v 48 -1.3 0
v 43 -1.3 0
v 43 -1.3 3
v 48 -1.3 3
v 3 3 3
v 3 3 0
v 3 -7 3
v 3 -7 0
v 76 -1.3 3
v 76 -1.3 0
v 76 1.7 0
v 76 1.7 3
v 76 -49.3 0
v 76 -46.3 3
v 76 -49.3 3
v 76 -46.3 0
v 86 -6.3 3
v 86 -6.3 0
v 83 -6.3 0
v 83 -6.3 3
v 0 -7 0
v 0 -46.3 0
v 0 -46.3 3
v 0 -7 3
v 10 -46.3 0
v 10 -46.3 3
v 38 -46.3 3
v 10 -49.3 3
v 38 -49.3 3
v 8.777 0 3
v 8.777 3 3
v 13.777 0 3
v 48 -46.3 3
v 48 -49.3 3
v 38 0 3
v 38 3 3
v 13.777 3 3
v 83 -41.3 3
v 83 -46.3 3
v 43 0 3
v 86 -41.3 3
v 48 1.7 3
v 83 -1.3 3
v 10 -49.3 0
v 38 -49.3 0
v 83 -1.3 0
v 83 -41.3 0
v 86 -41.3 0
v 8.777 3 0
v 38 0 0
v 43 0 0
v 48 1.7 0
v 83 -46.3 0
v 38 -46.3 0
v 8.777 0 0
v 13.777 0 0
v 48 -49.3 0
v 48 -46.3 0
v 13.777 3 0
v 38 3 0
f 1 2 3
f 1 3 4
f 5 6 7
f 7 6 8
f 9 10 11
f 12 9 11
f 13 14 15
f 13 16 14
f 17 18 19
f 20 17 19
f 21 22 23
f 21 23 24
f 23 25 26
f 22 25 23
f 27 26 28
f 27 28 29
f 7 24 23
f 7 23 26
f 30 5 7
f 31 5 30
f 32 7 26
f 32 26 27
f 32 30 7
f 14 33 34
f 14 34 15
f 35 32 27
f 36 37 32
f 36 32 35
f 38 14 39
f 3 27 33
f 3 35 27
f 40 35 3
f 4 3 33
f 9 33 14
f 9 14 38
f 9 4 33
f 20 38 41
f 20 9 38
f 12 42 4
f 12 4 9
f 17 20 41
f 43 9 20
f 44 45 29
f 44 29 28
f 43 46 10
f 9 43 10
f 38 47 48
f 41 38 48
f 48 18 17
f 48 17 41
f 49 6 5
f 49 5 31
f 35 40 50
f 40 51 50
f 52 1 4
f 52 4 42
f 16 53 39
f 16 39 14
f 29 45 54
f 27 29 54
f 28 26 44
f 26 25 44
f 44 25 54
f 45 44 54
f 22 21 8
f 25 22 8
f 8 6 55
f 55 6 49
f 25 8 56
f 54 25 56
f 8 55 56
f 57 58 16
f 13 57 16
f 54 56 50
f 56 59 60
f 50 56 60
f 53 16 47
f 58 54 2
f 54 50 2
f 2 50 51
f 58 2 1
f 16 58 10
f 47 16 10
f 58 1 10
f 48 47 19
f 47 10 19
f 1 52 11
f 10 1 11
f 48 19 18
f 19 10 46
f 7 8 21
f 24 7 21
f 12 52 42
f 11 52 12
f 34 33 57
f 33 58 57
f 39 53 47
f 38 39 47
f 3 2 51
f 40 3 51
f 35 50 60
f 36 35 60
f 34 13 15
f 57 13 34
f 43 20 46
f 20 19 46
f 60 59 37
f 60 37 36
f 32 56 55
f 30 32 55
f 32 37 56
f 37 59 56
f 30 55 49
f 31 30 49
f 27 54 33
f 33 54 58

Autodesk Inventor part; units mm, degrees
ref_plane "YZ Plane" through (0, 0, 0) normal (1, 0, 0) x (0, 1, 0)
ref_plane "XZ Plane" through (0, 0, 0) normal (0, 1, 0) x (-1, 0, 0)
ref_plane "XY Plane" through (0, 0, 0) normal (0, 0, 1) x (1, 0, 0)
sketch "Sketch1" plane through (0, 0, 0) normal (0, 0, 1) x (1, 0, 0)
  line L0 (0, -46.3) -> (0, 3) projected
  line L1 (3, 3) -> (43, 3) projected
  line L2 (3, 3) -> (0, 3) projected
  line L3 (43, 0) -> (43, 3) projected
  line L4 (43, 1.7) -> (86, 1.7) projected
  line L5 (86, -1.3) -> (86, 1.7) projected
  line L6 (86, -1.3) -> (86, -46.3) projected
  line L7 (86, -46.3) -> (86, -49.3) projected
  line L8 (86, -49.3) -> (0, -49.3) projected
  line L9 (0, -46.3) -> (0, -49.3) projected
  line L10 (3, -46.3) -> (0, -46.3) projected
  line L11 (3, 3) -> (3, 0) projected
  line L12 (43, -1.3) -> (43, 1.7) projected
  line L13 (83, -46.3) -> (83, -1.3) projected
  line L14 (83, -46.3) -> (86, -46.3) projected
  line L15 (86, -1.3) -> (86, -46.3) projected
  line L16 (83, -1.3) -> (86, -1.3) projected
  line L17 (83, -46.3) -> (76, -46.3)
  line L18 (76, -46.3) -> (76, -49.3)
  line L19 (83, -1.3) -> (76, -1.3)
  line L20 (76, -1.3) -> (76, 1.7)
  line L21 (43, -1.3) -> (48, -1.3)
  line L22 (48, -1.3) -> (48, 1.7)
  line L23 (43, 0) -> (38, 0)
  line L24 (38, 0) -> (38, 3)
  line L25 (3, -46.3) -> (10, -46.3)
  line L26 (10, -46.3) -> (10, -49.3)
  line L27 (3, 0) -> (3, -7)
  line L28 (3, -7) -> (0, -7)
  line L29 (13.777, 0) -> (8.777, 0)
  line L30 (8.777, 0) -> (8.777, 3)
  line L31 (8.777, 3) -> (13.777, 3)
  line L32 (13.777, 3) -> (13.777, 0)
  line L33 (48, -49.3) -> (38, -49.3)
  line L34 (38, -49.3) -> (38, -46.3)
  line L35 (38, -46.3) -> (48, -46.3)
  line L36 (48, -46.3) -> (48, -49.3)
  line L37 (86, -6.3) -> (83, -6.3)
  line L38 (83, -41.3) -> (86, -41.3)
  point P0 (0, 0)
  point P1 (43, -49.3)
  dimension "d0" = 10
  dimension "d1" = 10
  dimension "d2" = 10
  dimension "d3" = 10
  dimension "d4" = 10
  dimension "d5" = 5
  dimension "d6" = 5
  dimension "d7" = 5
  dimension "d10" = 5
  dimension "d11" = 5
extrude "Extrusion1" add sketch "Sketch1" along normal blind 3 contours L0 L28 L27 L11 L1 L30 L29 L32 L24 L23 L12 L21 L22 L4 L20 L19 L13 L17 L18 L8 L36 L35 L34 L26 L25 L10 | L38 L13 L37 L6
properties part number "top" material "Acrylic, Clear"
